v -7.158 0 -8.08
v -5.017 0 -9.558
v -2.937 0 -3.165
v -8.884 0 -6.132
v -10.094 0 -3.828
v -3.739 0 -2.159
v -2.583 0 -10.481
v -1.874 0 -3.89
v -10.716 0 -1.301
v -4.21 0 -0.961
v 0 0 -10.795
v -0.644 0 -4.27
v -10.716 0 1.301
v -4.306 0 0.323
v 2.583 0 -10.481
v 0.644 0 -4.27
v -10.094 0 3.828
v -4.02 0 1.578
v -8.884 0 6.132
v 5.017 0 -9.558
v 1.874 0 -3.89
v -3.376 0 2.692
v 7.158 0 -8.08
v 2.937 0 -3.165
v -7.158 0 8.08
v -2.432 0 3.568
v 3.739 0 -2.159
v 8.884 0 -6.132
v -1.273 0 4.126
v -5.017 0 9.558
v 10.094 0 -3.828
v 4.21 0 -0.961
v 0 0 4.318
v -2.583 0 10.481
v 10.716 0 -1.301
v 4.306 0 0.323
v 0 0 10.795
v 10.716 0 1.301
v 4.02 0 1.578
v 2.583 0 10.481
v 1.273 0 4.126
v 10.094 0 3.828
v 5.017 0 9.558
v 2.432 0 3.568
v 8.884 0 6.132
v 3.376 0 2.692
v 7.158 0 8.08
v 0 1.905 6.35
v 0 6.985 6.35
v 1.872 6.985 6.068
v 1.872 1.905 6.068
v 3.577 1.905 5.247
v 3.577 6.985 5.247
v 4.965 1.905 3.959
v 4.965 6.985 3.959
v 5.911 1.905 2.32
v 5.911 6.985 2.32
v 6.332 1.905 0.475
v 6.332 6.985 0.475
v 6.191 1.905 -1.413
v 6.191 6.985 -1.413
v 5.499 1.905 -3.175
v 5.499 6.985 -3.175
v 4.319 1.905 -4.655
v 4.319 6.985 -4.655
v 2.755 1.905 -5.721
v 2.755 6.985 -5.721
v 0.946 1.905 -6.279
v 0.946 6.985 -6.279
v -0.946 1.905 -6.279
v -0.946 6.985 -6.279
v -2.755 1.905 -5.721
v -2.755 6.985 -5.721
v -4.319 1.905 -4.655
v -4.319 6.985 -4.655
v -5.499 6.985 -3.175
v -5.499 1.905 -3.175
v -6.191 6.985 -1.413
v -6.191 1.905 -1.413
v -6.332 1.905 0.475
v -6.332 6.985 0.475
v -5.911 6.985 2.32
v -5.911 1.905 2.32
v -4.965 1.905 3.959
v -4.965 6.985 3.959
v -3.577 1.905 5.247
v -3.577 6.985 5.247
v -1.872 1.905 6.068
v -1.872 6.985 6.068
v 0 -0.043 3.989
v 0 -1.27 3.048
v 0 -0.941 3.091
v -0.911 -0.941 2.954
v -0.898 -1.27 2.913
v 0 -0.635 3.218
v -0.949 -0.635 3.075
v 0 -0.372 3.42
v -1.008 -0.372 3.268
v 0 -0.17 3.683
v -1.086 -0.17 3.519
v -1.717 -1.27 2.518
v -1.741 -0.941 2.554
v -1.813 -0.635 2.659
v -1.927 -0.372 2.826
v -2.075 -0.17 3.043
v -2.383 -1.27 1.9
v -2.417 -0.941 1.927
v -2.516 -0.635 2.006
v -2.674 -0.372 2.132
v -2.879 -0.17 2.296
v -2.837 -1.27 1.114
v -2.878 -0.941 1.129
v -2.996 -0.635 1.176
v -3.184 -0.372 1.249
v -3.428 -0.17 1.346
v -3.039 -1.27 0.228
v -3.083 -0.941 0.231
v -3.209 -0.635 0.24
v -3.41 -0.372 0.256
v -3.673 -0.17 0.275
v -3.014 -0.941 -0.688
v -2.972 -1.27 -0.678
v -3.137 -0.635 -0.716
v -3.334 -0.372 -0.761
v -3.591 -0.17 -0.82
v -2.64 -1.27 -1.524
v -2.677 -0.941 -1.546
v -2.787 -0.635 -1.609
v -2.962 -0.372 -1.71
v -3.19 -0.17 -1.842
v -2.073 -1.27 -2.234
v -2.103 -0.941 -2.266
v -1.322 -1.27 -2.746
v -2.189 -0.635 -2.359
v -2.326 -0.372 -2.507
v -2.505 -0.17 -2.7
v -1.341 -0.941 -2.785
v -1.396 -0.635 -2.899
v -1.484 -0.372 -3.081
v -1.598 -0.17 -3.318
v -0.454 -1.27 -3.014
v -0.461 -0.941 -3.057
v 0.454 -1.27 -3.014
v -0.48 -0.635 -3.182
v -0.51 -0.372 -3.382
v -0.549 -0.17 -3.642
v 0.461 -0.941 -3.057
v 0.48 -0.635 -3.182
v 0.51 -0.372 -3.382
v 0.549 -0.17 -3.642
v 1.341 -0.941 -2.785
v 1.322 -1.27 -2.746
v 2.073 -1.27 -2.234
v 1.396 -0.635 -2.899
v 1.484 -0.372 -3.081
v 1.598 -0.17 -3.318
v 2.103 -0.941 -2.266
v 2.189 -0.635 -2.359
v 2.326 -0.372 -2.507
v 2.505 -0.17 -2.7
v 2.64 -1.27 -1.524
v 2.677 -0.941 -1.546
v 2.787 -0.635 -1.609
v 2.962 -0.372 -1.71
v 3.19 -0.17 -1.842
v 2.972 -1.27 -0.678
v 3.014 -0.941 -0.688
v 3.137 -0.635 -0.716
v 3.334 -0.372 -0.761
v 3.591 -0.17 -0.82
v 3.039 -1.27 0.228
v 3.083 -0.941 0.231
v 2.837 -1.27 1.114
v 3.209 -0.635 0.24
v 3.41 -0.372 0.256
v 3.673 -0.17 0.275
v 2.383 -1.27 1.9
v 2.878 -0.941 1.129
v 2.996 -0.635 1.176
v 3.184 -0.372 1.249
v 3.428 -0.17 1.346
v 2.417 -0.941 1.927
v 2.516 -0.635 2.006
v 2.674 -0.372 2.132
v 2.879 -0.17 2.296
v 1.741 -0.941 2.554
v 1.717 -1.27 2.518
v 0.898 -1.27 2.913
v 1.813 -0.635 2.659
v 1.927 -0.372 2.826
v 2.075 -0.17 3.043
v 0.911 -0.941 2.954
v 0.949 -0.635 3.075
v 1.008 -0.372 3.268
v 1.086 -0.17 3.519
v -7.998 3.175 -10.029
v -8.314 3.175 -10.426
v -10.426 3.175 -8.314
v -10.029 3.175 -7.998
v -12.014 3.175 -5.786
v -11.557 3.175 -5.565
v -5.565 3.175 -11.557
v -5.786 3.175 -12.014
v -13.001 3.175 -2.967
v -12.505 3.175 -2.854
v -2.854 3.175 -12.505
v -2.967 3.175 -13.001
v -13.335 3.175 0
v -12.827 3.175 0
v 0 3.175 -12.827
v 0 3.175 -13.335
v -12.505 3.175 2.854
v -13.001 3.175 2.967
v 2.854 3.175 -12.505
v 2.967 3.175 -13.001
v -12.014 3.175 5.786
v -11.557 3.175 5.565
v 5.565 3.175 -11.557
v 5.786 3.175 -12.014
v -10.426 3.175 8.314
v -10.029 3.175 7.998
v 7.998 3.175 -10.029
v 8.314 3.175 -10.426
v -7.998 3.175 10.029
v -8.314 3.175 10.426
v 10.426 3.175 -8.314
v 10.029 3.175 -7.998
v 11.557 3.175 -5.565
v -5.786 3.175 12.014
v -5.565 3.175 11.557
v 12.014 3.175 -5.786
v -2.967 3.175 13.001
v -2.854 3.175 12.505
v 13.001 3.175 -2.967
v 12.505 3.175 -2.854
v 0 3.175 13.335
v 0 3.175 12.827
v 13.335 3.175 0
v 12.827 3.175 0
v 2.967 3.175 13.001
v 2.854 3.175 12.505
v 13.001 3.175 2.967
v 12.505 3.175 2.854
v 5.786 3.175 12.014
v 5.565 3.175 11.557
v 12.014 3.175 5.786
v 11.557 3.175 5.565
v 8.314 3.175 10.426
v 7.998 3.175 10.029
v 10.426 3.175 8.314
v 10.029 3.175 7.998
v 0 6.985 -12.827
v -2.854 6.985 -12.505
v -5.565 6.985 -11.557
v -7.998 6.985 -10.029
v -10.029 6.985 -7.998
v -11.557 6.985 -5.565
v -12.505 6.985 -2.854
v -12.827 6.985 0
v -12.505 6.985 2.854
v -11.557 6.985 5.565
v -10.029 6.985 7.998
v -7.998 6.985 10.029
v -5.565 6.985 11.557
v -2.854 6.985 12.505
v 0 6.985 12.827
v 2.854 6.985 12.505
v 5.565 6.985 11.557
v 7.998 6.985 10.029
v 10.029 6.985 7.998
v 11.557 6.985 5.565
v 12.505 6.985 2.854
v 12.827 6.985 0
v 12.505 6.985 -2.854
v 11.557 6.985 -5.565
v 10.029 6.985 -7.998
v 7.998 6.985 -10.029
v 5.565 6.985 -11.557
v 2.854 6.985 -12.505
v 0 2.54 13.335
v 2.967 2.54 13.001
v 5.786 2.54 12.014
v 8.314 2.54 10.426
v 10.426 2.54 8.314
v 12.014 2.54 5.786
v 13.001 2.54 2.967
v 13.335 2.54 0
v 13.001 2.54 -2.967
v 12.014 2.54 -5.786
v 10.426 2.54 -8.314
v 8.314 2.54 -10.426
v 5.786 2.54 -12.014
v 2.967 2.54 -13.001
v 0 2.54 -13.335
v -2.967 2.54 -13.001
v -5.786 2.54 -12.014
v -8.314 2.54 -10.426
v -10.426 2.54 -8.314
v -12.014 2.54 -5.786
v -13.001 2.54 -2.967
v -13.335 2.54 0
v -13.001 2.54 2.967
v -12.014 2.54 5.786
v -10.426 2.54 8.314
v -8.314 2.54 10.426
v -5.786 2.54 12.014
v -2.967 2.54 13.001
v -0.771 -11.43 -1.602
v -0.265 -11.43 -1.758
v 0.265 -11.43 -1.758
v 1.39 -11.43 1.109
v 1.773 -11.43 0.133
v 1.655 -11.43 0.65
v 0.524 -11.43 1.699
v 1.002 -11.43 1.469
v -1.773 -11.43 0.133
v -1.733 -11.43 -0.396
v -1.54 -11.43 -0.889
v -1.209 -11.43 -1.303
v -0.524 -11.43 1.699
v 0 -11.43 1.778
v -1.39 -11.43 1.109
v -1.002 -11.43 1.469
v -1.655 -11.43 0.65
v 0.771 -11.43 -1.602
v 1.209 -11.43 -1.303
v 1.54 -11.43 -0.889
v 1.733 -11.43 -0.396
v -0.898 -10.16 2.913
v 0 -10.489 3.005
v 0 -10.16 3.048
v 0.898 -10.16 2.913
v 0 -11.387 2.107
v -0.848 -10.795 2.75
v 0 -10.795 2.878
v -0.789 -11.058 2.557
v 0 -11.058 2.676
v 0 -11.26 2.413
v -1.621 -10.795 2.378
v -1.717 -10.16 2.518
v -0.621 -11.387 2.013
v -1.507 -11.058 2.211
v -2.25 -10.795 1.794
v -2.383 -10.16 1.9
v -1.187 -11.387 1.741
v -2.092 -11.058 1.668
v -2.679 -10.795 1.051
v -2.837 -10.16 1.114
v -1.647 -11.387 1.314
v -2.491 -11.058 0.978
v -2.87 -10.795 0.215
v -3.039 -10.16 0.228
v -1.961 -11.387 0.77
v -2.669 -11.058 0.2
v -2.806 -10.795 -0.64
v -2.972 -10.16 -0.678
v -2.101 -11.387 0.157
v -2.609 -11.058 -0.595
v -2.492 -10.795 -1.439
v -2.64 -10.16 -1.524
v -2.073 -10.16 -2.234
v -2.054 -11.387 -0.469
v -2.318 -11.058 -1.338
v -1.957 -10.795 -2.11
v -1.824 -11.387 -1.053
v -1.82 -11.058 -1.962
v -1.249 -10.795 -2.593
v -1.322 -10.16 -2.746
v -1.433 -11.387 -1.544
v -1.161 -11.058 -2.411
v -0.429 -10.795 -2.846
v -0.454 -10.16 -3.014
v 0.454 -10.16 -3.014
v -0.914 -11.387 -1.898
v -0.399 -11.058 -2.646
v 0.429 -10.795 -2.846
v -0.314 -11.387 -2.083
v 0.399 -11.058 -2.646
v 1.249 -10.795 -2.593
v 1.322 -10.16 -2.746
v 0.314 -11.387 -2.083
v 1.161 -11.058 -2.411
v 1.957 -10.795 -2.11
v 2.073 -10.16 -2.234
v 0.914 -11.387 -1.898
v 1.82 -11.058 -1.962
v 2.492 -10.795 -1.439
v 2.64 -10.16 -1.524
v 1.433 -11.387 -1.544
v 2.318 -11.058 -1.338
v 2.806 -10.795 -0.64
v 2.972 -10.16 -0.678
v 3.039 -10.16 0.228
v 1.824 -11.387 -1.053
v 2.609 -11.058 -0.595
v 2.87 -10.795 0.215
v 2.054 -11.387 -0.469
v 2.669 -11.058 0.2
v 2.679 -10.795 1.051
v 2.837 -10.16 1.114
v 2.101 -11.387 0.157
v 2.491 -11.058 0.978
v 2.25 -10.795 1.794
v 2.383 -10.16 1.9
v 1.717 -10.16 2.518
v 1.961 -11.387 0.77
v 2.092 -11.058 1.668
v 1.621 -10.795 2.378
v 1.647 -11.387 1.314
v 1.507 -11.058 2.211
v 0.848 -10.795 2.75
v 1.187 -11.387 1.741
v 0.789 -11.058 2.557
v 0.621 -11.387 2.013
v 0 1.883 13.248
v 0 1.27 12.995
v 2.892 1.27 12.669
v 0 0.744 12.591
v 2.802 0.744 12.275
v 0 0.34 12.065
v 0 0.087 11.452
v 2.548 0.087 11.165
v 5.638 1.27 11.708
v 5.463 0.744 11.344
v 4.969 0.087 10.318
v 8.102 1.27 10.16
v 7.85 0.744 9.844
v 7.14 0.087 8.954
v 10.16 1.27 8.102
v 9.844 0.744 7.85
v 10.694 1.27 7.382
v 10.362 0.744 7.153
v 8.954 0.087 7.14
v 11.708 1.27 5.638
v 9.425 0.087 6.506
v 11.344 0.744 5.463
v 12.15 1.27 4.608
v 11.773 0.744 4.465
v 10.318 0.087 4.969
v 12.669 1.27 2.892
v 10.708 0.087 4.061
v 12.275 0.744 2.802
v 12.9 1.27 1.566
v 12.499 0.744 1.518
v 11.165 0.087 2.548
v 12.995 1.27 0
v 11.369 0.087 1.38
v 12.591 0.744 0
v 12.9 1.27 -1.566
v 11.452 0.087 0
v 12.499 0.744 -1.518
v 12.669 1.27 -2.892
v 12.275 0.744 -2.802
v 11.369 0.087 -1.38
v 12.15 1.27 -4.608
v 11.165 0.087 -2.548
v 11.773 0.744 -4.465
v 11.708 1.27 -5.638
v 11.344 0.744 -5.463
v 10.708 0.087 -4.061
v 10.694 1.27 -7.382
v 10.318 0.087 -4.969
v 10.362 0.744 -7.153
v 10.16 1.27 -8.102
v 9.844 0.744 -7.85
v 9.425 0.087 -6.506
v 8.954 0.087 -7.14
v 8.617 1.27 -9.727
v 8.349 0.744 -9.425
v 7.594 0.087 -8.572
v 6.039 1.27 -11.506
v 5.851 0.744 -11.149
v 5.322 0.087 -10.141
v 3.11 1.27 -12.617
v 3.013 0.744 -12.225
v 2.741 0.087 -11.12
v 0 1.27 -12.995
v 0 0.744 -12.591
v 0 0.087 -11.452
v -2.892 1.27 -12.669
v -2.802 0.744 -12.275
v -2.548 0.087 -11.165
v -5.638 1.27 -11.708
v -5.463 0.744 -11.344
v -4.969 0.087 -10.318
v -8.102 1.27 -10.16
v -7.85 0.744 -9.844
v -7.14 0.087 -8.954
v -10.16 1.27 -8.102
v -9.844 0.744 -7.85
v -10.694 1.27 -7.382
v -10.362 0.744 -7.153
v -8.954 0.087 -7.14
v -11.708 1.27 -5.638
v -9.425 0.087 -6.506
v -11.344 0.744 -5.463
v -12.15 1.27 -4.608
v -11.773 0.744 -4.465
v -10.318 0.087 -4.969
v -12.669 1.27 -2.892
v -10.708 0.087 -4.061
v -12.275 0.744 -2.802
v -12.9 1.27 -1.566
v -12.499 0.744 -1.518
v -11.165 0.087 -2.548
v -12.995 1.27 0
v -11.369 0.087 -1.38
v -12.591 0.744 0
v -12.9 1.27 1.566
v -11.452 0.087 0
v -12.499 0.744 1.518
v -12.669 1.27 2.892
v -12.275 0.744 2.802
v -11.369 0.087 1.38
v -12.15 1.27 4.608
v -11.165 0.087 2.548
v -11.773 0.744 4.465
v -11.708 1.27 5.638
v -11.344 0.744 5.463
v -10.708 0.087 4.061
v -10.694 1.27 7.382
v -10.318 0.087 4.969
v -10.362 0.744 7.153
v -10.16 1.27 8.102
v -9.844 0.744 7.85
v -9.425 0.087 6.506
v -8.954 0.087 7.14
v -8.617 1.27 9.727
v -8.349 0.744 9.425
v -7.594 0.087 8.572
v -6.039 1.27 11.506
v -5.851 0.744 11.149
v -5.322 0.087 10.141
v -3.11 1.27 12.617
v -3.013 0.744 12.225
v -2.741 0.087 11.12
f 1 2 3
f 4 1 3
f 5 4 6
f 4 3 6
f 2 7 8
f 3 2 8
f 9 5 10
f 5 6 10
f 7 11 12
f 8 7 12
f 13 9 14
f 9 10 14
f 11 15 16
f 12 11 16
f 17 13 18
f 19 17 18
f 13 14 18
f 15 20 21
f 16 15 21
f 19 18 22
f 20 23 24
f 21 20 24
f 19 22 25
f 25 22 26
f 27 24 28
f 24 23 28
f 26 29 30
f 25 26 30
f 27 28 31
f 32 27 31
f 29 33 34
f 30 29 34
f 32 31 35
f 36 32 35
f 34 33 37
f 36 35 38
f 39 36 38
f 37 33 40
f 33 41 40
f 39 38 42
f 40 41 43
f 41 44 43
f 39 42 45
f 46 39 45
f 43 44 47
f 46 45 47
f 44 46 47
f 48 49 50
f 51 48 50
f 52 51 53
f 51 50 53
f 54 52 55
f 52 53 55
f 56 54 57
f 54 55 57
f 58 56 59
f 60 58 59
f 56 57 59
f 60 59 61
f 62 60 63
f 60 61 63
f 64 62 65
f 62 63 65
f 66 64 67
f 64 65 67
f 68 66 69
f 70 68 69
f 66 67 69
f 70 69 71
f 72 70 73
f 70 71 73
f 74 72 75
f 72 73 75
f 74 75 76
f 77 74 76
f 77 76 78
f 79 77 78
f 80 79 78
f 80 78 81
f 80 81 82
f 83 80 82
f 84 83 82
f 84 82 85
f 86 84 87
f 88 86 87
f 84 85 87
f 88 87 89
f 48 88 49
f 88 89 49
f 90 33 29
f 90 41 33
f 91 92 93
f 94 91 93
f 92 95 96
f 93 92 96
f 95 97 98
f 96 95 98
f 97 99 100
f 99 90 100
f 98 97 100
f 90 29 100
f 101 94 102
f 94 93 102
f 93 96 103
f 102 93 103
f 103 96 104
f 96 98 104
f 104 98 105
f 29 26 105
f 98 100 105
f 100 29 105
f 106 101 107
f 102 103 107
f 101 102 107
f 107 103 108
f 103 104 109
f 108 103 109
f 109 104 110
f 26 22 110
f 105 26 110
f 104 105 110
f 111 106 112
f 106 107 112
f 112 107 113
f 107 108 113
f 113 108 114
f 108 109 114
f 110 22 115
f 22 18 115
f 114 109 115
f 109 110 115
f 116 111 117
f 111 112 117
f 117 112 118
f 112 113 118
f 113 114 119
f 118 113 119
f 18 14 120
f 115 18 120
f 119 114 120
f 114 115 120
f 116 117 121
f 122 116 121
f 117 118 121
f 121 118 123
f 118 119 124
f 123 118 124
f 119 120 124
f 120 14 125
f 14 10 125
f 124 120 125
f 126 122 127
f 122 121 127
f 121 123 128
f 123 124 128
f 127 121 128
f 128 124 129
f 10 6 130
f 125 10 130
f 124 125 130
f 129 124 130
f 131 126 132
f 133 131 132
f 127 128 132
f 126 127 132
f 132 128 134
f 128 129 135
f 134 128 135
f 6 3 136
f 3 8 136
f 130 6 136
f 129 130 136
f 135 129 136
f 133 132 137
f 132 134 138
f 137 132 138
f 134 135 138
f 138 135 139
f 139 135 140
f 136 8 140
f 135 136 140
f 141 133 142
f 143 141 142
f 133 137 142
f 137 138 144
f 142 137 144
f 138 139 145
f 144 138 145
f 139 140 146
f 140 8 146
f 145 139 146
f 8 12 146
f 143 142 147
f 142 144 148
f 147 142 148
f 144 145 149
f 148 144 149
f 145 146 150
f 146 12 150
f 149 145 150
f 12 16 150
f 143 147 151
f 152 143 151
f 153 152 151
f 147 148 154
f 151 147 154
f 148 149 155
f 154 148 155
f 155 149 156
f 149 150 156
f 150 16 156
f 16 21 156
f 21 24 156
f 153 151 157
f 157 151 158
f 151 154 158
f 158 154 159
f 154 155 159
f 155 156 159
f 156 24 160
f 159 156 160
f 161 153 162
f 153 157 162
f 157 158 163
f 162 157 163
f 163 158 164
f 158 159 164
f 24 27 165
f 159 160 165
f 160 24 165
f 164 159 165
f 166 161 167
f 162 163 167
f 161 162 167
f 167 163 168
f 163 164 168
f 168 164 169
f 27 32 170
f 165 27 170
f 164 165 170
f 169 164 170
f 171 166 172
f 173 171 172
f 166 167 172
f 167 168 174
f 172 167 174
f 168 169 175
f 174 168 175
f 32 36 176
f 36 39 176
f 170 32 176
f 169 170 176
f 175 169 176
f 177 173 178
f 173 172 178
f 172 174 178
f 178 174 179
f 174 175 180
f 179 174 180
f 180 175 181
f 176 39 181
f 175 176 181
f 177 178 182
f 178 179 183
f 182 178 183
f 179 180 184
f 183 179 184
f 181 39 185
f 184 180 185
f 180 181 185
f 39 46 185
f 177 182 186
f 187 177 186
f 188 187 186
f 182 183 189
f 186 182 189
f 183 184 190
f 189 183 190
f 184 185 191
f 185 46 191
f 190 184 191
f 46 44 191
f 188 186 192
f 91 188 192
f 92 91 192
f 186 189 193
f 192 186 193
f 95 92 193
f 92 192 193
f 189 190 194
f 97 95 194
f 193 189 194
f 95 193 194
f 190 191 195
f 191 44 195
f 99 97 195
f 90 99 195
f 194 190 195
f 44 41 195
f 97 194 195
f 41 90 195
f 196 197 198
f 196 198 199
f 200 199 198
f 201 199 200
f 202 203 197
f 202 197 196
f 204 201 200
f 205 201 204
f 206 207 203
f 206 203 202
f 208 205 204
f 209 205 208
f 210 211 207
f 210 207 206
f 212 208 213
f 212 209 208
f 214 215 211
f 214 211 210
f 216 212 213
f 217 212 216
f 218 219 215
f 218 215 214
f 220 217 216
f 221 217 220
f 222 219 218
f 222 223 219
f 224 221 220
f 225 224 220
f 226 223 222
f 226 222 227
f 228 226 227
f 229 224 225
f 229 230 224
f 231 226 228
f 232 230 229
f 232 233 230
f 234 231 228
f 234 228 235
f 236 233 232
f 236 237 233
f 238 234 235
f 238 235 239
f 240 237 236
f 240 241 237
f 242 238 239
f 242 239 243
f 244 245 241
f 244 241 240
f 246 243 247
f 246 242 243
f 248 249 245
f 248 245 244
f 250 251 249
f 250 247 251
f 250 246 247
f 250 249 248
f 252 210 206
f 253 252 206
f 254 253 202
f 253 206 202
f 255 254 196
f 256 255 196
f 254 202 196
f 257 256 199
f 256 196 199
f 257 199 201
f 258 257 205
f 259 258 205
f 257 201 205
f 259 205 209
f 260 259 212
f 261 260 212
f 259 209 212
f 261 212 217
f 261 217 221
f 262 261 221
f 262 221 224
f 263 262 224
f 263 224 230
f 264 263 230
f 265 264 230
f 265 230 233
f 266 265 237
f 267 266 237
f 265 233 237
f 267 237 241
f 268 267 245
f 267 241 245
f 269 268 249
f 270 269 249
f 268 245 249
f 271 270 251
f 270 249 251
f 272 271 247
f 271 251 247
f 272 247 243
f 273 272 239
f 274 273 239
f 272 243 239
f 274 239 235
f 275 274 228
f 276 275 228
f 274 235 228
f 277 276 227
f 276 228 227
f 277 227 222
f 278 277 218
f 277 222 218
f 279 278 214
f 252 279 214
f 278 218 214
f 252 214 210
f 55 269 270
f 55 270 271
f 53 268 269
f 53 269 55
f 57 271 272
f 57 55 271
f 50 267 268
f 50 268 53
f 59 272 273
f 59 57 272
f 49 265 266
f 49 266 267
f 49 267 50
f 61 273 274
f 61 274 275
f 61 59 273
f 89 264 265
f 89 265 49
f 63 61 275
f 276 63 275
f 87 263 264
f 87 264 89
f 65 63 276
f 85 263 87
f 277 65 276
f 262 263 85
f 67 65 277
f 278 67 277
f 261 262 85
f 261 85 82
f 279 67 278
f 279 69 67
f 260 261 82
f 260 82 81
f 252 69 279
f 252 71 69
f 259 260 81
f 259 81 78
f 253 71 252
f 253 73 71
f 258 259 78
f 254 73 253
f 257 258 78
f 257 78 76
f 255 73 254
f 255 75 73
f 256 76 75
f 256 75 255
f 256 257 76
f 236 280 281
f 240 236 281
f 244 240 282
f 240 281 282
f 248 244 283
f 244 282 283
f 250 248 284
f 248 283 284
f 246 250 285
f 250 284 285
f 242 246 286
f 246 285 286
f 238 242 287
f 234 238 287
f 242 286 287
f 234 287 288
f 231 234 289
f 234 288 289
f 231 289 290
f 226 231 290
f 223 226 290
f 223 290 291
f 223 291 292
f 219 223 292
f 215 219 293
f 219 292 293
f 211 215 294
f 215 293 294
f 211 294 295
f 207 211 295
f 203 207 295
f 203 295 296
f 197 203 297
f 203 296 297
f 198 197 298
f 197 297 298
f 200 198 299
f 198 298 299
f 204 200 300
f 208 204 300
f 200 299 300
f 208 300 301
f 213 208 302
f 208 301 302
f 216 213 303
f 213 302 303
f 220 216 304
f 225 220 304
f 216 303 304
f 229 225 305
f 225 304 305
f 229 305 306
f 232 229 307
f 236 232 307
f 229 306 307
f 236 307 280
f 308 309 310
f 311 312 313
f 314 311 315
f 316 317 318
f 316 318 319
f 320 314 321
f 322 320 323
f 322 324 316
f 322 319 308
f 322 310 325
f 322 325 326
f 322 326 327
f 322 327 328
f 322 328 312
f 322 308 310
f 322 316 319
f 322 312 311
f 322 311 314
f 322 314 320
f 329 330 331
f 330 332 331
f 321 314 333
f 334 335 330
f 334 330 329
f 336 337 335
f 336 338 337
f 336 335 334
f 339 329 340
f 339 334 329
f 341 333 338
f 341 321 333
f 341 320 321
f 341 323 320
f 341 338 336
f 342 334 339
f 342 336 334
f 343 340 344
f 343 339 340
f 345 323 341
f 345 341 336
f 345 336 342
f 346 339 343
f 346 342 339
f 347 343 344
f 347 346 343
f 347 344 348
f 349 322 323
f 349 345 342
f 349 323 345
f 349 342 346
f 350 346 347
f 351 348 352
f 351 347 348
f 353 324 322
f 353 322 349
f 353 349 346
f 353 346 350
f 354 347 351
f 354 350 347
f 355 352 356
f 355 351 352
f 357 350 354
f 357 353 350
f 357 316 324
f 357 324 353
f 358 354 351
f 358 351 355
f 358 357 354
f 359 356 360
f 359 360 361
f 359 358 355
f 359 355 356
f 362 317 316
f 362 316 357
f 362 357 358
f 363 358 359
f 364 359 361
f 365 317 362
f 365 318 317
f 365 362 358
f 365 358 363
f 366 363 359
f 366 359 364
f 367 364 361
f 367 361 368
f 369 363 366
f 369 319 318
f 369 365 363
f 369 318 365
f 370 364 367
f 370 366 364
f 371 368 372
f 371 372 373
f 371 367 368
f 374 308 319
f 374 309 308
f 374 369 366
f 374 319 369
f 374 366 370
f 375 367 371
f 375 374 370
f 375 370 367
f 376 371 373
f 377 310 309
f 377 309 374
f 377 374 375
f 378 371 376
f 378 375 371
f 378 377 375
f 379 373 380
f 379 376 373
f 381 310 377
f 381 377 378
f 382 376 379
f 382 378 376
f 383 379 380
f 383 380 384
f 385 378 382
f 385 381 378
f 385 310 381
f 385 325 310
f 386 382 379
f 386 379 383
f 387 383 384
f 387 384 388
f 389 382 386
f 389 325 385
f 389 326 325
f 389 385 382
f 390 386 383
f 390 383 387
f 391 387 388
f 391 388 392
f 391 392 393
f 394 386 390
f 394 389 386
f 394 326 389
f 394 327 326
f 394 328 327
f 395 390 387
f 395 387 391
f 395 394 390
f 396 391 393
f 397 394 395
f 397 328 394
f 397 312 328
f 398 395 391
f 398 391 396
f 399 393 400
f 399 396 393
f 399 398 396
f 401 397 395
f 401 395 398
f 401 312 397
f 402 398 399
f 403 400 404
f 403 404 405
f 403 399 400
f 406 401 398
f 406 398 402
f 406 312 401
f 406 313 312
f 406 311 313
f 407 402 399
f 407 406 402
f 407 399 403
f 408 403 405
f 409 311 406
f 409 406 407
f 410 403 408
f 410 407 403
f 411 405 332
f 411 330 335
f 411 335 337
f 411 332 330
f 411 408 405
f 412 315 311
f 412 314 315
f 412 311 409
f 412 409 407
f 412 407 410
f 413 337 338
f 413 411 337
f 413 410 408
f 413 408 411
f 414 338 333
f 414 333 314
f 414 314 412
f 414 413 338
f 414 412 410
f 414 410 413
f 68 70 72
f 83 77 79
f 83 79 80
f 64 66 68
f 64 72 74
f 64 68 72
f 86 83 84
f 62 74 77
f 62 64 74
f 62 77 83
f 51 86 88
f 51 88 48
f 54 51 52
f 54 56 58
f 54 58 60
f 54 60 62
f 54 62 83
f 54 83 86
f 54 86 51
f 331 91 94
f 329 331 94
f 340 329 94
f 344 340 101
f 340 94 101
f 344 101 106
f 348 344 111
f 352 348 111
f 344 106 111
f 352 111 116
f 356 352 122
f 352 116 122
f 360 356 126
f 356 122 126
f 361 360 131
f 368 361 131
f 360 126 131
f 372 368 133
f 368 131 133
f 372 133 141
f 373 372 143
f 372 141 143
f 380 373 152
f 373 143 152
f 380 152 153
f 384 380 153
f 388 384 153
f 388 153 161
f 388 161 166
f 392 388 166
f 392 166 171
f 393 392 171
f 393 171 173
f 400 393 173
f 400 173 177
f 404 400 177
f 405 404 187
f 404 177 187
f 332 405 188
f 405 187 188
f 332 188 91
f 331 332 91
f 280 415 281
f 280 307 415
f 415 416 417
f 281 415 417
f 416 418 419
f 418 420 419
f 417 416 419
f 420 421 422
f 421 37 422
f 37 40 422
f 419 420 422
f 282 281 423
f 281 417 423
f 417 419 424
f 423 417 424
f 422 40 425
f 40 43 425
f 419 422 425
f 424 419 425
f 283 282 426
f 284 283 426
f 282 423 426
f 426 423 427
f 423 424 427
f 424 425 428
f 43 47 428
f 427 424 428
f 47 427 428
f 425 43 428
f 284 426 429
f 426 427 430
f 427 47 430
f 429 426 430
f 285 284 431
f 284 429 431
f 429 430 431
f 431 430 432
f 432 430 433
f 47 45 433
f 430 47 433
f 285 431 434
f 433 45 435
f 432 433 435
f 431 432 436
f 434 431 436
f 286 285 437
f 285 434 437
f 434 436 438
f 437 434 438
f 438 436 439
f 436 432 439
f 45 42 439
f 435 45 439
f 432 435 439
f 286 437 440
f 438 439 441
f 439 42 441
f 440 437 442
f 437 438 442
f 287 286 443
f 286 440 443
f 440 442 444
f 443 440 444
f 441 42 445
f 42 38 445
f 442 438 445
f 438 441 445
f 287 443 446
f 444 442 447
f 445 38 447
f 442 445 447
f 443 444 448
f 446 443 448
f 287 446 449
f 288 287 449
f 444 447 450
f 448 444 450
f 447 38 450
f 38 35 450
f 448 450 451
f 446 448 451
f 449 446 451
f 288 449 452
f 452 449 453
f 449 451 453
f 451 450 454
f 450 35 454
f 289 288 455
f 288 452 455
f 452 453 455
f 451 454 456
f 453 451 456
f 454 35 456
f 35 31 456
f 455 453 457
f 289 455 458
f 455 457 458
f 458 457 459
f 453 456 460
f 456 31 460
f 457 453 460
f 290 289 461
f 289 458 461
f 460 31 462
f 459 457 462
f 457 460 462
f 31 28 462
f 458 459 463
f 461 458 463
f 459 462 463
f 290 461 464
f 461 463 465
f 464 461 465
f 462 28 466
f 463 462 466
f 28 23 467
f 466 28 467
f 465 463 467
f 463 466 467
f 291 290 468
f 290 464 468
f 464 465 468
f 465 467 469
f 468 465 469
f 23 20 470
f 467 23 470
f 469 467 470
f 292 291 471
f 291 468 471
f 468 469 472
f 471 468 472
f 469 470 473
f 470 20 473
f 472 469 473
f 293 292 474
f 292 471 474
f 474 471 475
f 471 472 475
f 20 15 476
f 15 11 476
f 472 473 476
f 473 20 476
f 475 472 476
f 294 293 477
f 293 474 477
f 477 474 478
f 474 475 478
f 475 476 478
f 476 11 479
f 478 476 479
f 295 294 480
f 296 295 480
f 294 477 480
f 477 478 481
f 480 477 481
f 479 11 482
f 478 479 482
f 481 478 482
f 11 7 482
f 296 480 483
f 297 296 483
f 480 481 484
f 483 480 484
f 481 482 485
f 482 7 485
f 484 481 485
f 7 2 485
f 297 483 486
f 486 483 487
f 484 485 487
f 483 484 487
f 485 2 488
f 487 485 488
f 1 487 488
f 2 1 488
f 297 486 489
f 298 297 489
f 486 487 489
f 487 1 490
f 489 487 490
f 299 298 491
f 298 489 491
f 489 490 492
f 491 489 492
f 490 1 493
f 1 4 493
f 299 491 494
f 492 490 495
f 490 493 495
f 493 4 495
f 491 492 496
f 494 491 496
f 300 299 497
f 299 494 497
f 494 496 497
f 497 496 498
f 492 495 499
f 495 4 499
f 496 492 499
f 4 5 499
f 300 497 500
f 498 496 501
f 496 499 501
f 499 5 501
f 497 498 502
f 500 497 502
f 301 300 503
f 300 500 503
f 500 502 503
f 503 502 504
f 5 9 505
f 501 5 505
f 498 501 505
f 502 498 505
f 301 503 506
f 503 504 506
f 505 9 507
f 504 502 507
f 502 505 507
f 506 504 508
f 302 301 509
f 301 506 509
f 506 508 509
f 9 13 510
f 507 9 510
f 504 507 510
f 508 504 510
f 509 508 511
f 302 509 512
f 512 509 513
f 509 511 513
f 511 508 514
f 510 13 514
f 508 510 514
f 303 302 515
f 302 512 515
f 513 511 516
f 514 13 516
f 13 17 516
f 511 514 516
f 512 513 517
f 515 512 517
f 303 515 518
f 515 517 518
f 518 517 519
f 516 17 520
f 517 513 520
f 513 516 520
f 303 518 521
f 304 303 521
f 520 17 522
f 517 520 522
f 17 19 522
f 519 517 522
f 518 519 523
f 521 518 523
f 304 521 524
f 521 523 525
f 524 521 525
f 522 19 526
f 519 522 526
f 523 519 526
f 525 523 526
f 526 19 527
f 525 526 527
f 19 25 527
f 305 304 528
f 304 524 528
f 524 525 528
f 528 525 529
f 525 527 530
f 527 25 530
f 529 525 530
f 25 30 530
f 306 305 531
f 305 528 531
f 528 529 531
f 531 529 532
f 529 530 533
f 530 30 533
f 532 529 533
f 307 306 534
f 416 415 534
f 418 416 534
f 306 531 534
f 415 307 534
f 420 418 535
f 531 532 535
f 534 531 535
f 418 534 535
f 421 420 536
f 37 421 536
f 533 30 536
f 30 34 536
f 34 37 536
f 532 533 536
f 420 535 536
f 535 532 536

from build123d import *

# Parameters (mm, degrees)
SKETCH1_R           = 13.335
BOSS_EXTRUDE1_DEPTH = 3.175
SKETCH2_R           = 12.827
BOSS_EXTRUDE2_DEPTH = 3.81
SKETCH3_R           = 6.35
CUT_EXTRUDE2_DEPTH  = 5.08
FILLET1_R           = 2.54
SKETCH5_R           = 3.048
BOSS_EXTRUDE3_DEPTH = 11.43
FILLET2_R           = 1.27
FILLET3_R           = 1.27


with BuildPart() as part:
    # Sketch1 → Boss-Extrude1 (new body)
    with BuildSketch(Plane(origin=(0, 0, 0), x_dir=(1, 0, 0), z_dir=(0, 1, 0))):
        Circle(SKETCH1_R)
    extrude(amount=BOSS_EXTRUDE1_DEPTH)

    # Sketch2 → Boss-Extrude2 (add)
    with BuildSketch(Plane(origin=(0, 3.175, 0), x_dir=(1, 0, 0), z_dir=(0, 1, 0))):
        Circle(SKETCH2_R)
    extrude(amount=BOSS_EXTRUDE2_DEPTH)

    # Sketch3 → Cut-Extrude2 (cut)
    with BuildSketch(Plane(origin=(0, 6.985, 0), x_dir=(1, 0, 0), z_dir=(0, 1, 0))):
        Circle(SKETCH3_R)
    extrude(amount=-CUT_EXTRUDE2_DEPTH, mode=Mode.SUBTRACT)

    # Fillet1
    fillet1_edges = [part.edges().sort_by_distance(p)[0] for p in [
        (-13.335, 0, 0),
    ]]
    fillet(fillet1_edges, radius=FILLET1_R)

    # Sketch5 → Boss-Extrude3 (add)
    with BuildSketch(Plane.XZ):
        Circle(SKETCH5_R)
    extrude(amount=BOSS_EXTRUDE3_DEPTH)

    # Fillet2
    fillet2_edges = [part.edges().sort_by_distance(p)[0] for p in [
        (-3.048, -11.43, 0),
    ]]
    fillet(fillet2_edges, radius=FILLET2_R)

    # Fillet3
    fillet3_edges = [part.edges().sort_by_distance(p)[0] for p in [
        (-3.048, 0, 0),
    ]]
    fillet(fillet3_edges, radius=FILLET3_R)


solid = part.part
